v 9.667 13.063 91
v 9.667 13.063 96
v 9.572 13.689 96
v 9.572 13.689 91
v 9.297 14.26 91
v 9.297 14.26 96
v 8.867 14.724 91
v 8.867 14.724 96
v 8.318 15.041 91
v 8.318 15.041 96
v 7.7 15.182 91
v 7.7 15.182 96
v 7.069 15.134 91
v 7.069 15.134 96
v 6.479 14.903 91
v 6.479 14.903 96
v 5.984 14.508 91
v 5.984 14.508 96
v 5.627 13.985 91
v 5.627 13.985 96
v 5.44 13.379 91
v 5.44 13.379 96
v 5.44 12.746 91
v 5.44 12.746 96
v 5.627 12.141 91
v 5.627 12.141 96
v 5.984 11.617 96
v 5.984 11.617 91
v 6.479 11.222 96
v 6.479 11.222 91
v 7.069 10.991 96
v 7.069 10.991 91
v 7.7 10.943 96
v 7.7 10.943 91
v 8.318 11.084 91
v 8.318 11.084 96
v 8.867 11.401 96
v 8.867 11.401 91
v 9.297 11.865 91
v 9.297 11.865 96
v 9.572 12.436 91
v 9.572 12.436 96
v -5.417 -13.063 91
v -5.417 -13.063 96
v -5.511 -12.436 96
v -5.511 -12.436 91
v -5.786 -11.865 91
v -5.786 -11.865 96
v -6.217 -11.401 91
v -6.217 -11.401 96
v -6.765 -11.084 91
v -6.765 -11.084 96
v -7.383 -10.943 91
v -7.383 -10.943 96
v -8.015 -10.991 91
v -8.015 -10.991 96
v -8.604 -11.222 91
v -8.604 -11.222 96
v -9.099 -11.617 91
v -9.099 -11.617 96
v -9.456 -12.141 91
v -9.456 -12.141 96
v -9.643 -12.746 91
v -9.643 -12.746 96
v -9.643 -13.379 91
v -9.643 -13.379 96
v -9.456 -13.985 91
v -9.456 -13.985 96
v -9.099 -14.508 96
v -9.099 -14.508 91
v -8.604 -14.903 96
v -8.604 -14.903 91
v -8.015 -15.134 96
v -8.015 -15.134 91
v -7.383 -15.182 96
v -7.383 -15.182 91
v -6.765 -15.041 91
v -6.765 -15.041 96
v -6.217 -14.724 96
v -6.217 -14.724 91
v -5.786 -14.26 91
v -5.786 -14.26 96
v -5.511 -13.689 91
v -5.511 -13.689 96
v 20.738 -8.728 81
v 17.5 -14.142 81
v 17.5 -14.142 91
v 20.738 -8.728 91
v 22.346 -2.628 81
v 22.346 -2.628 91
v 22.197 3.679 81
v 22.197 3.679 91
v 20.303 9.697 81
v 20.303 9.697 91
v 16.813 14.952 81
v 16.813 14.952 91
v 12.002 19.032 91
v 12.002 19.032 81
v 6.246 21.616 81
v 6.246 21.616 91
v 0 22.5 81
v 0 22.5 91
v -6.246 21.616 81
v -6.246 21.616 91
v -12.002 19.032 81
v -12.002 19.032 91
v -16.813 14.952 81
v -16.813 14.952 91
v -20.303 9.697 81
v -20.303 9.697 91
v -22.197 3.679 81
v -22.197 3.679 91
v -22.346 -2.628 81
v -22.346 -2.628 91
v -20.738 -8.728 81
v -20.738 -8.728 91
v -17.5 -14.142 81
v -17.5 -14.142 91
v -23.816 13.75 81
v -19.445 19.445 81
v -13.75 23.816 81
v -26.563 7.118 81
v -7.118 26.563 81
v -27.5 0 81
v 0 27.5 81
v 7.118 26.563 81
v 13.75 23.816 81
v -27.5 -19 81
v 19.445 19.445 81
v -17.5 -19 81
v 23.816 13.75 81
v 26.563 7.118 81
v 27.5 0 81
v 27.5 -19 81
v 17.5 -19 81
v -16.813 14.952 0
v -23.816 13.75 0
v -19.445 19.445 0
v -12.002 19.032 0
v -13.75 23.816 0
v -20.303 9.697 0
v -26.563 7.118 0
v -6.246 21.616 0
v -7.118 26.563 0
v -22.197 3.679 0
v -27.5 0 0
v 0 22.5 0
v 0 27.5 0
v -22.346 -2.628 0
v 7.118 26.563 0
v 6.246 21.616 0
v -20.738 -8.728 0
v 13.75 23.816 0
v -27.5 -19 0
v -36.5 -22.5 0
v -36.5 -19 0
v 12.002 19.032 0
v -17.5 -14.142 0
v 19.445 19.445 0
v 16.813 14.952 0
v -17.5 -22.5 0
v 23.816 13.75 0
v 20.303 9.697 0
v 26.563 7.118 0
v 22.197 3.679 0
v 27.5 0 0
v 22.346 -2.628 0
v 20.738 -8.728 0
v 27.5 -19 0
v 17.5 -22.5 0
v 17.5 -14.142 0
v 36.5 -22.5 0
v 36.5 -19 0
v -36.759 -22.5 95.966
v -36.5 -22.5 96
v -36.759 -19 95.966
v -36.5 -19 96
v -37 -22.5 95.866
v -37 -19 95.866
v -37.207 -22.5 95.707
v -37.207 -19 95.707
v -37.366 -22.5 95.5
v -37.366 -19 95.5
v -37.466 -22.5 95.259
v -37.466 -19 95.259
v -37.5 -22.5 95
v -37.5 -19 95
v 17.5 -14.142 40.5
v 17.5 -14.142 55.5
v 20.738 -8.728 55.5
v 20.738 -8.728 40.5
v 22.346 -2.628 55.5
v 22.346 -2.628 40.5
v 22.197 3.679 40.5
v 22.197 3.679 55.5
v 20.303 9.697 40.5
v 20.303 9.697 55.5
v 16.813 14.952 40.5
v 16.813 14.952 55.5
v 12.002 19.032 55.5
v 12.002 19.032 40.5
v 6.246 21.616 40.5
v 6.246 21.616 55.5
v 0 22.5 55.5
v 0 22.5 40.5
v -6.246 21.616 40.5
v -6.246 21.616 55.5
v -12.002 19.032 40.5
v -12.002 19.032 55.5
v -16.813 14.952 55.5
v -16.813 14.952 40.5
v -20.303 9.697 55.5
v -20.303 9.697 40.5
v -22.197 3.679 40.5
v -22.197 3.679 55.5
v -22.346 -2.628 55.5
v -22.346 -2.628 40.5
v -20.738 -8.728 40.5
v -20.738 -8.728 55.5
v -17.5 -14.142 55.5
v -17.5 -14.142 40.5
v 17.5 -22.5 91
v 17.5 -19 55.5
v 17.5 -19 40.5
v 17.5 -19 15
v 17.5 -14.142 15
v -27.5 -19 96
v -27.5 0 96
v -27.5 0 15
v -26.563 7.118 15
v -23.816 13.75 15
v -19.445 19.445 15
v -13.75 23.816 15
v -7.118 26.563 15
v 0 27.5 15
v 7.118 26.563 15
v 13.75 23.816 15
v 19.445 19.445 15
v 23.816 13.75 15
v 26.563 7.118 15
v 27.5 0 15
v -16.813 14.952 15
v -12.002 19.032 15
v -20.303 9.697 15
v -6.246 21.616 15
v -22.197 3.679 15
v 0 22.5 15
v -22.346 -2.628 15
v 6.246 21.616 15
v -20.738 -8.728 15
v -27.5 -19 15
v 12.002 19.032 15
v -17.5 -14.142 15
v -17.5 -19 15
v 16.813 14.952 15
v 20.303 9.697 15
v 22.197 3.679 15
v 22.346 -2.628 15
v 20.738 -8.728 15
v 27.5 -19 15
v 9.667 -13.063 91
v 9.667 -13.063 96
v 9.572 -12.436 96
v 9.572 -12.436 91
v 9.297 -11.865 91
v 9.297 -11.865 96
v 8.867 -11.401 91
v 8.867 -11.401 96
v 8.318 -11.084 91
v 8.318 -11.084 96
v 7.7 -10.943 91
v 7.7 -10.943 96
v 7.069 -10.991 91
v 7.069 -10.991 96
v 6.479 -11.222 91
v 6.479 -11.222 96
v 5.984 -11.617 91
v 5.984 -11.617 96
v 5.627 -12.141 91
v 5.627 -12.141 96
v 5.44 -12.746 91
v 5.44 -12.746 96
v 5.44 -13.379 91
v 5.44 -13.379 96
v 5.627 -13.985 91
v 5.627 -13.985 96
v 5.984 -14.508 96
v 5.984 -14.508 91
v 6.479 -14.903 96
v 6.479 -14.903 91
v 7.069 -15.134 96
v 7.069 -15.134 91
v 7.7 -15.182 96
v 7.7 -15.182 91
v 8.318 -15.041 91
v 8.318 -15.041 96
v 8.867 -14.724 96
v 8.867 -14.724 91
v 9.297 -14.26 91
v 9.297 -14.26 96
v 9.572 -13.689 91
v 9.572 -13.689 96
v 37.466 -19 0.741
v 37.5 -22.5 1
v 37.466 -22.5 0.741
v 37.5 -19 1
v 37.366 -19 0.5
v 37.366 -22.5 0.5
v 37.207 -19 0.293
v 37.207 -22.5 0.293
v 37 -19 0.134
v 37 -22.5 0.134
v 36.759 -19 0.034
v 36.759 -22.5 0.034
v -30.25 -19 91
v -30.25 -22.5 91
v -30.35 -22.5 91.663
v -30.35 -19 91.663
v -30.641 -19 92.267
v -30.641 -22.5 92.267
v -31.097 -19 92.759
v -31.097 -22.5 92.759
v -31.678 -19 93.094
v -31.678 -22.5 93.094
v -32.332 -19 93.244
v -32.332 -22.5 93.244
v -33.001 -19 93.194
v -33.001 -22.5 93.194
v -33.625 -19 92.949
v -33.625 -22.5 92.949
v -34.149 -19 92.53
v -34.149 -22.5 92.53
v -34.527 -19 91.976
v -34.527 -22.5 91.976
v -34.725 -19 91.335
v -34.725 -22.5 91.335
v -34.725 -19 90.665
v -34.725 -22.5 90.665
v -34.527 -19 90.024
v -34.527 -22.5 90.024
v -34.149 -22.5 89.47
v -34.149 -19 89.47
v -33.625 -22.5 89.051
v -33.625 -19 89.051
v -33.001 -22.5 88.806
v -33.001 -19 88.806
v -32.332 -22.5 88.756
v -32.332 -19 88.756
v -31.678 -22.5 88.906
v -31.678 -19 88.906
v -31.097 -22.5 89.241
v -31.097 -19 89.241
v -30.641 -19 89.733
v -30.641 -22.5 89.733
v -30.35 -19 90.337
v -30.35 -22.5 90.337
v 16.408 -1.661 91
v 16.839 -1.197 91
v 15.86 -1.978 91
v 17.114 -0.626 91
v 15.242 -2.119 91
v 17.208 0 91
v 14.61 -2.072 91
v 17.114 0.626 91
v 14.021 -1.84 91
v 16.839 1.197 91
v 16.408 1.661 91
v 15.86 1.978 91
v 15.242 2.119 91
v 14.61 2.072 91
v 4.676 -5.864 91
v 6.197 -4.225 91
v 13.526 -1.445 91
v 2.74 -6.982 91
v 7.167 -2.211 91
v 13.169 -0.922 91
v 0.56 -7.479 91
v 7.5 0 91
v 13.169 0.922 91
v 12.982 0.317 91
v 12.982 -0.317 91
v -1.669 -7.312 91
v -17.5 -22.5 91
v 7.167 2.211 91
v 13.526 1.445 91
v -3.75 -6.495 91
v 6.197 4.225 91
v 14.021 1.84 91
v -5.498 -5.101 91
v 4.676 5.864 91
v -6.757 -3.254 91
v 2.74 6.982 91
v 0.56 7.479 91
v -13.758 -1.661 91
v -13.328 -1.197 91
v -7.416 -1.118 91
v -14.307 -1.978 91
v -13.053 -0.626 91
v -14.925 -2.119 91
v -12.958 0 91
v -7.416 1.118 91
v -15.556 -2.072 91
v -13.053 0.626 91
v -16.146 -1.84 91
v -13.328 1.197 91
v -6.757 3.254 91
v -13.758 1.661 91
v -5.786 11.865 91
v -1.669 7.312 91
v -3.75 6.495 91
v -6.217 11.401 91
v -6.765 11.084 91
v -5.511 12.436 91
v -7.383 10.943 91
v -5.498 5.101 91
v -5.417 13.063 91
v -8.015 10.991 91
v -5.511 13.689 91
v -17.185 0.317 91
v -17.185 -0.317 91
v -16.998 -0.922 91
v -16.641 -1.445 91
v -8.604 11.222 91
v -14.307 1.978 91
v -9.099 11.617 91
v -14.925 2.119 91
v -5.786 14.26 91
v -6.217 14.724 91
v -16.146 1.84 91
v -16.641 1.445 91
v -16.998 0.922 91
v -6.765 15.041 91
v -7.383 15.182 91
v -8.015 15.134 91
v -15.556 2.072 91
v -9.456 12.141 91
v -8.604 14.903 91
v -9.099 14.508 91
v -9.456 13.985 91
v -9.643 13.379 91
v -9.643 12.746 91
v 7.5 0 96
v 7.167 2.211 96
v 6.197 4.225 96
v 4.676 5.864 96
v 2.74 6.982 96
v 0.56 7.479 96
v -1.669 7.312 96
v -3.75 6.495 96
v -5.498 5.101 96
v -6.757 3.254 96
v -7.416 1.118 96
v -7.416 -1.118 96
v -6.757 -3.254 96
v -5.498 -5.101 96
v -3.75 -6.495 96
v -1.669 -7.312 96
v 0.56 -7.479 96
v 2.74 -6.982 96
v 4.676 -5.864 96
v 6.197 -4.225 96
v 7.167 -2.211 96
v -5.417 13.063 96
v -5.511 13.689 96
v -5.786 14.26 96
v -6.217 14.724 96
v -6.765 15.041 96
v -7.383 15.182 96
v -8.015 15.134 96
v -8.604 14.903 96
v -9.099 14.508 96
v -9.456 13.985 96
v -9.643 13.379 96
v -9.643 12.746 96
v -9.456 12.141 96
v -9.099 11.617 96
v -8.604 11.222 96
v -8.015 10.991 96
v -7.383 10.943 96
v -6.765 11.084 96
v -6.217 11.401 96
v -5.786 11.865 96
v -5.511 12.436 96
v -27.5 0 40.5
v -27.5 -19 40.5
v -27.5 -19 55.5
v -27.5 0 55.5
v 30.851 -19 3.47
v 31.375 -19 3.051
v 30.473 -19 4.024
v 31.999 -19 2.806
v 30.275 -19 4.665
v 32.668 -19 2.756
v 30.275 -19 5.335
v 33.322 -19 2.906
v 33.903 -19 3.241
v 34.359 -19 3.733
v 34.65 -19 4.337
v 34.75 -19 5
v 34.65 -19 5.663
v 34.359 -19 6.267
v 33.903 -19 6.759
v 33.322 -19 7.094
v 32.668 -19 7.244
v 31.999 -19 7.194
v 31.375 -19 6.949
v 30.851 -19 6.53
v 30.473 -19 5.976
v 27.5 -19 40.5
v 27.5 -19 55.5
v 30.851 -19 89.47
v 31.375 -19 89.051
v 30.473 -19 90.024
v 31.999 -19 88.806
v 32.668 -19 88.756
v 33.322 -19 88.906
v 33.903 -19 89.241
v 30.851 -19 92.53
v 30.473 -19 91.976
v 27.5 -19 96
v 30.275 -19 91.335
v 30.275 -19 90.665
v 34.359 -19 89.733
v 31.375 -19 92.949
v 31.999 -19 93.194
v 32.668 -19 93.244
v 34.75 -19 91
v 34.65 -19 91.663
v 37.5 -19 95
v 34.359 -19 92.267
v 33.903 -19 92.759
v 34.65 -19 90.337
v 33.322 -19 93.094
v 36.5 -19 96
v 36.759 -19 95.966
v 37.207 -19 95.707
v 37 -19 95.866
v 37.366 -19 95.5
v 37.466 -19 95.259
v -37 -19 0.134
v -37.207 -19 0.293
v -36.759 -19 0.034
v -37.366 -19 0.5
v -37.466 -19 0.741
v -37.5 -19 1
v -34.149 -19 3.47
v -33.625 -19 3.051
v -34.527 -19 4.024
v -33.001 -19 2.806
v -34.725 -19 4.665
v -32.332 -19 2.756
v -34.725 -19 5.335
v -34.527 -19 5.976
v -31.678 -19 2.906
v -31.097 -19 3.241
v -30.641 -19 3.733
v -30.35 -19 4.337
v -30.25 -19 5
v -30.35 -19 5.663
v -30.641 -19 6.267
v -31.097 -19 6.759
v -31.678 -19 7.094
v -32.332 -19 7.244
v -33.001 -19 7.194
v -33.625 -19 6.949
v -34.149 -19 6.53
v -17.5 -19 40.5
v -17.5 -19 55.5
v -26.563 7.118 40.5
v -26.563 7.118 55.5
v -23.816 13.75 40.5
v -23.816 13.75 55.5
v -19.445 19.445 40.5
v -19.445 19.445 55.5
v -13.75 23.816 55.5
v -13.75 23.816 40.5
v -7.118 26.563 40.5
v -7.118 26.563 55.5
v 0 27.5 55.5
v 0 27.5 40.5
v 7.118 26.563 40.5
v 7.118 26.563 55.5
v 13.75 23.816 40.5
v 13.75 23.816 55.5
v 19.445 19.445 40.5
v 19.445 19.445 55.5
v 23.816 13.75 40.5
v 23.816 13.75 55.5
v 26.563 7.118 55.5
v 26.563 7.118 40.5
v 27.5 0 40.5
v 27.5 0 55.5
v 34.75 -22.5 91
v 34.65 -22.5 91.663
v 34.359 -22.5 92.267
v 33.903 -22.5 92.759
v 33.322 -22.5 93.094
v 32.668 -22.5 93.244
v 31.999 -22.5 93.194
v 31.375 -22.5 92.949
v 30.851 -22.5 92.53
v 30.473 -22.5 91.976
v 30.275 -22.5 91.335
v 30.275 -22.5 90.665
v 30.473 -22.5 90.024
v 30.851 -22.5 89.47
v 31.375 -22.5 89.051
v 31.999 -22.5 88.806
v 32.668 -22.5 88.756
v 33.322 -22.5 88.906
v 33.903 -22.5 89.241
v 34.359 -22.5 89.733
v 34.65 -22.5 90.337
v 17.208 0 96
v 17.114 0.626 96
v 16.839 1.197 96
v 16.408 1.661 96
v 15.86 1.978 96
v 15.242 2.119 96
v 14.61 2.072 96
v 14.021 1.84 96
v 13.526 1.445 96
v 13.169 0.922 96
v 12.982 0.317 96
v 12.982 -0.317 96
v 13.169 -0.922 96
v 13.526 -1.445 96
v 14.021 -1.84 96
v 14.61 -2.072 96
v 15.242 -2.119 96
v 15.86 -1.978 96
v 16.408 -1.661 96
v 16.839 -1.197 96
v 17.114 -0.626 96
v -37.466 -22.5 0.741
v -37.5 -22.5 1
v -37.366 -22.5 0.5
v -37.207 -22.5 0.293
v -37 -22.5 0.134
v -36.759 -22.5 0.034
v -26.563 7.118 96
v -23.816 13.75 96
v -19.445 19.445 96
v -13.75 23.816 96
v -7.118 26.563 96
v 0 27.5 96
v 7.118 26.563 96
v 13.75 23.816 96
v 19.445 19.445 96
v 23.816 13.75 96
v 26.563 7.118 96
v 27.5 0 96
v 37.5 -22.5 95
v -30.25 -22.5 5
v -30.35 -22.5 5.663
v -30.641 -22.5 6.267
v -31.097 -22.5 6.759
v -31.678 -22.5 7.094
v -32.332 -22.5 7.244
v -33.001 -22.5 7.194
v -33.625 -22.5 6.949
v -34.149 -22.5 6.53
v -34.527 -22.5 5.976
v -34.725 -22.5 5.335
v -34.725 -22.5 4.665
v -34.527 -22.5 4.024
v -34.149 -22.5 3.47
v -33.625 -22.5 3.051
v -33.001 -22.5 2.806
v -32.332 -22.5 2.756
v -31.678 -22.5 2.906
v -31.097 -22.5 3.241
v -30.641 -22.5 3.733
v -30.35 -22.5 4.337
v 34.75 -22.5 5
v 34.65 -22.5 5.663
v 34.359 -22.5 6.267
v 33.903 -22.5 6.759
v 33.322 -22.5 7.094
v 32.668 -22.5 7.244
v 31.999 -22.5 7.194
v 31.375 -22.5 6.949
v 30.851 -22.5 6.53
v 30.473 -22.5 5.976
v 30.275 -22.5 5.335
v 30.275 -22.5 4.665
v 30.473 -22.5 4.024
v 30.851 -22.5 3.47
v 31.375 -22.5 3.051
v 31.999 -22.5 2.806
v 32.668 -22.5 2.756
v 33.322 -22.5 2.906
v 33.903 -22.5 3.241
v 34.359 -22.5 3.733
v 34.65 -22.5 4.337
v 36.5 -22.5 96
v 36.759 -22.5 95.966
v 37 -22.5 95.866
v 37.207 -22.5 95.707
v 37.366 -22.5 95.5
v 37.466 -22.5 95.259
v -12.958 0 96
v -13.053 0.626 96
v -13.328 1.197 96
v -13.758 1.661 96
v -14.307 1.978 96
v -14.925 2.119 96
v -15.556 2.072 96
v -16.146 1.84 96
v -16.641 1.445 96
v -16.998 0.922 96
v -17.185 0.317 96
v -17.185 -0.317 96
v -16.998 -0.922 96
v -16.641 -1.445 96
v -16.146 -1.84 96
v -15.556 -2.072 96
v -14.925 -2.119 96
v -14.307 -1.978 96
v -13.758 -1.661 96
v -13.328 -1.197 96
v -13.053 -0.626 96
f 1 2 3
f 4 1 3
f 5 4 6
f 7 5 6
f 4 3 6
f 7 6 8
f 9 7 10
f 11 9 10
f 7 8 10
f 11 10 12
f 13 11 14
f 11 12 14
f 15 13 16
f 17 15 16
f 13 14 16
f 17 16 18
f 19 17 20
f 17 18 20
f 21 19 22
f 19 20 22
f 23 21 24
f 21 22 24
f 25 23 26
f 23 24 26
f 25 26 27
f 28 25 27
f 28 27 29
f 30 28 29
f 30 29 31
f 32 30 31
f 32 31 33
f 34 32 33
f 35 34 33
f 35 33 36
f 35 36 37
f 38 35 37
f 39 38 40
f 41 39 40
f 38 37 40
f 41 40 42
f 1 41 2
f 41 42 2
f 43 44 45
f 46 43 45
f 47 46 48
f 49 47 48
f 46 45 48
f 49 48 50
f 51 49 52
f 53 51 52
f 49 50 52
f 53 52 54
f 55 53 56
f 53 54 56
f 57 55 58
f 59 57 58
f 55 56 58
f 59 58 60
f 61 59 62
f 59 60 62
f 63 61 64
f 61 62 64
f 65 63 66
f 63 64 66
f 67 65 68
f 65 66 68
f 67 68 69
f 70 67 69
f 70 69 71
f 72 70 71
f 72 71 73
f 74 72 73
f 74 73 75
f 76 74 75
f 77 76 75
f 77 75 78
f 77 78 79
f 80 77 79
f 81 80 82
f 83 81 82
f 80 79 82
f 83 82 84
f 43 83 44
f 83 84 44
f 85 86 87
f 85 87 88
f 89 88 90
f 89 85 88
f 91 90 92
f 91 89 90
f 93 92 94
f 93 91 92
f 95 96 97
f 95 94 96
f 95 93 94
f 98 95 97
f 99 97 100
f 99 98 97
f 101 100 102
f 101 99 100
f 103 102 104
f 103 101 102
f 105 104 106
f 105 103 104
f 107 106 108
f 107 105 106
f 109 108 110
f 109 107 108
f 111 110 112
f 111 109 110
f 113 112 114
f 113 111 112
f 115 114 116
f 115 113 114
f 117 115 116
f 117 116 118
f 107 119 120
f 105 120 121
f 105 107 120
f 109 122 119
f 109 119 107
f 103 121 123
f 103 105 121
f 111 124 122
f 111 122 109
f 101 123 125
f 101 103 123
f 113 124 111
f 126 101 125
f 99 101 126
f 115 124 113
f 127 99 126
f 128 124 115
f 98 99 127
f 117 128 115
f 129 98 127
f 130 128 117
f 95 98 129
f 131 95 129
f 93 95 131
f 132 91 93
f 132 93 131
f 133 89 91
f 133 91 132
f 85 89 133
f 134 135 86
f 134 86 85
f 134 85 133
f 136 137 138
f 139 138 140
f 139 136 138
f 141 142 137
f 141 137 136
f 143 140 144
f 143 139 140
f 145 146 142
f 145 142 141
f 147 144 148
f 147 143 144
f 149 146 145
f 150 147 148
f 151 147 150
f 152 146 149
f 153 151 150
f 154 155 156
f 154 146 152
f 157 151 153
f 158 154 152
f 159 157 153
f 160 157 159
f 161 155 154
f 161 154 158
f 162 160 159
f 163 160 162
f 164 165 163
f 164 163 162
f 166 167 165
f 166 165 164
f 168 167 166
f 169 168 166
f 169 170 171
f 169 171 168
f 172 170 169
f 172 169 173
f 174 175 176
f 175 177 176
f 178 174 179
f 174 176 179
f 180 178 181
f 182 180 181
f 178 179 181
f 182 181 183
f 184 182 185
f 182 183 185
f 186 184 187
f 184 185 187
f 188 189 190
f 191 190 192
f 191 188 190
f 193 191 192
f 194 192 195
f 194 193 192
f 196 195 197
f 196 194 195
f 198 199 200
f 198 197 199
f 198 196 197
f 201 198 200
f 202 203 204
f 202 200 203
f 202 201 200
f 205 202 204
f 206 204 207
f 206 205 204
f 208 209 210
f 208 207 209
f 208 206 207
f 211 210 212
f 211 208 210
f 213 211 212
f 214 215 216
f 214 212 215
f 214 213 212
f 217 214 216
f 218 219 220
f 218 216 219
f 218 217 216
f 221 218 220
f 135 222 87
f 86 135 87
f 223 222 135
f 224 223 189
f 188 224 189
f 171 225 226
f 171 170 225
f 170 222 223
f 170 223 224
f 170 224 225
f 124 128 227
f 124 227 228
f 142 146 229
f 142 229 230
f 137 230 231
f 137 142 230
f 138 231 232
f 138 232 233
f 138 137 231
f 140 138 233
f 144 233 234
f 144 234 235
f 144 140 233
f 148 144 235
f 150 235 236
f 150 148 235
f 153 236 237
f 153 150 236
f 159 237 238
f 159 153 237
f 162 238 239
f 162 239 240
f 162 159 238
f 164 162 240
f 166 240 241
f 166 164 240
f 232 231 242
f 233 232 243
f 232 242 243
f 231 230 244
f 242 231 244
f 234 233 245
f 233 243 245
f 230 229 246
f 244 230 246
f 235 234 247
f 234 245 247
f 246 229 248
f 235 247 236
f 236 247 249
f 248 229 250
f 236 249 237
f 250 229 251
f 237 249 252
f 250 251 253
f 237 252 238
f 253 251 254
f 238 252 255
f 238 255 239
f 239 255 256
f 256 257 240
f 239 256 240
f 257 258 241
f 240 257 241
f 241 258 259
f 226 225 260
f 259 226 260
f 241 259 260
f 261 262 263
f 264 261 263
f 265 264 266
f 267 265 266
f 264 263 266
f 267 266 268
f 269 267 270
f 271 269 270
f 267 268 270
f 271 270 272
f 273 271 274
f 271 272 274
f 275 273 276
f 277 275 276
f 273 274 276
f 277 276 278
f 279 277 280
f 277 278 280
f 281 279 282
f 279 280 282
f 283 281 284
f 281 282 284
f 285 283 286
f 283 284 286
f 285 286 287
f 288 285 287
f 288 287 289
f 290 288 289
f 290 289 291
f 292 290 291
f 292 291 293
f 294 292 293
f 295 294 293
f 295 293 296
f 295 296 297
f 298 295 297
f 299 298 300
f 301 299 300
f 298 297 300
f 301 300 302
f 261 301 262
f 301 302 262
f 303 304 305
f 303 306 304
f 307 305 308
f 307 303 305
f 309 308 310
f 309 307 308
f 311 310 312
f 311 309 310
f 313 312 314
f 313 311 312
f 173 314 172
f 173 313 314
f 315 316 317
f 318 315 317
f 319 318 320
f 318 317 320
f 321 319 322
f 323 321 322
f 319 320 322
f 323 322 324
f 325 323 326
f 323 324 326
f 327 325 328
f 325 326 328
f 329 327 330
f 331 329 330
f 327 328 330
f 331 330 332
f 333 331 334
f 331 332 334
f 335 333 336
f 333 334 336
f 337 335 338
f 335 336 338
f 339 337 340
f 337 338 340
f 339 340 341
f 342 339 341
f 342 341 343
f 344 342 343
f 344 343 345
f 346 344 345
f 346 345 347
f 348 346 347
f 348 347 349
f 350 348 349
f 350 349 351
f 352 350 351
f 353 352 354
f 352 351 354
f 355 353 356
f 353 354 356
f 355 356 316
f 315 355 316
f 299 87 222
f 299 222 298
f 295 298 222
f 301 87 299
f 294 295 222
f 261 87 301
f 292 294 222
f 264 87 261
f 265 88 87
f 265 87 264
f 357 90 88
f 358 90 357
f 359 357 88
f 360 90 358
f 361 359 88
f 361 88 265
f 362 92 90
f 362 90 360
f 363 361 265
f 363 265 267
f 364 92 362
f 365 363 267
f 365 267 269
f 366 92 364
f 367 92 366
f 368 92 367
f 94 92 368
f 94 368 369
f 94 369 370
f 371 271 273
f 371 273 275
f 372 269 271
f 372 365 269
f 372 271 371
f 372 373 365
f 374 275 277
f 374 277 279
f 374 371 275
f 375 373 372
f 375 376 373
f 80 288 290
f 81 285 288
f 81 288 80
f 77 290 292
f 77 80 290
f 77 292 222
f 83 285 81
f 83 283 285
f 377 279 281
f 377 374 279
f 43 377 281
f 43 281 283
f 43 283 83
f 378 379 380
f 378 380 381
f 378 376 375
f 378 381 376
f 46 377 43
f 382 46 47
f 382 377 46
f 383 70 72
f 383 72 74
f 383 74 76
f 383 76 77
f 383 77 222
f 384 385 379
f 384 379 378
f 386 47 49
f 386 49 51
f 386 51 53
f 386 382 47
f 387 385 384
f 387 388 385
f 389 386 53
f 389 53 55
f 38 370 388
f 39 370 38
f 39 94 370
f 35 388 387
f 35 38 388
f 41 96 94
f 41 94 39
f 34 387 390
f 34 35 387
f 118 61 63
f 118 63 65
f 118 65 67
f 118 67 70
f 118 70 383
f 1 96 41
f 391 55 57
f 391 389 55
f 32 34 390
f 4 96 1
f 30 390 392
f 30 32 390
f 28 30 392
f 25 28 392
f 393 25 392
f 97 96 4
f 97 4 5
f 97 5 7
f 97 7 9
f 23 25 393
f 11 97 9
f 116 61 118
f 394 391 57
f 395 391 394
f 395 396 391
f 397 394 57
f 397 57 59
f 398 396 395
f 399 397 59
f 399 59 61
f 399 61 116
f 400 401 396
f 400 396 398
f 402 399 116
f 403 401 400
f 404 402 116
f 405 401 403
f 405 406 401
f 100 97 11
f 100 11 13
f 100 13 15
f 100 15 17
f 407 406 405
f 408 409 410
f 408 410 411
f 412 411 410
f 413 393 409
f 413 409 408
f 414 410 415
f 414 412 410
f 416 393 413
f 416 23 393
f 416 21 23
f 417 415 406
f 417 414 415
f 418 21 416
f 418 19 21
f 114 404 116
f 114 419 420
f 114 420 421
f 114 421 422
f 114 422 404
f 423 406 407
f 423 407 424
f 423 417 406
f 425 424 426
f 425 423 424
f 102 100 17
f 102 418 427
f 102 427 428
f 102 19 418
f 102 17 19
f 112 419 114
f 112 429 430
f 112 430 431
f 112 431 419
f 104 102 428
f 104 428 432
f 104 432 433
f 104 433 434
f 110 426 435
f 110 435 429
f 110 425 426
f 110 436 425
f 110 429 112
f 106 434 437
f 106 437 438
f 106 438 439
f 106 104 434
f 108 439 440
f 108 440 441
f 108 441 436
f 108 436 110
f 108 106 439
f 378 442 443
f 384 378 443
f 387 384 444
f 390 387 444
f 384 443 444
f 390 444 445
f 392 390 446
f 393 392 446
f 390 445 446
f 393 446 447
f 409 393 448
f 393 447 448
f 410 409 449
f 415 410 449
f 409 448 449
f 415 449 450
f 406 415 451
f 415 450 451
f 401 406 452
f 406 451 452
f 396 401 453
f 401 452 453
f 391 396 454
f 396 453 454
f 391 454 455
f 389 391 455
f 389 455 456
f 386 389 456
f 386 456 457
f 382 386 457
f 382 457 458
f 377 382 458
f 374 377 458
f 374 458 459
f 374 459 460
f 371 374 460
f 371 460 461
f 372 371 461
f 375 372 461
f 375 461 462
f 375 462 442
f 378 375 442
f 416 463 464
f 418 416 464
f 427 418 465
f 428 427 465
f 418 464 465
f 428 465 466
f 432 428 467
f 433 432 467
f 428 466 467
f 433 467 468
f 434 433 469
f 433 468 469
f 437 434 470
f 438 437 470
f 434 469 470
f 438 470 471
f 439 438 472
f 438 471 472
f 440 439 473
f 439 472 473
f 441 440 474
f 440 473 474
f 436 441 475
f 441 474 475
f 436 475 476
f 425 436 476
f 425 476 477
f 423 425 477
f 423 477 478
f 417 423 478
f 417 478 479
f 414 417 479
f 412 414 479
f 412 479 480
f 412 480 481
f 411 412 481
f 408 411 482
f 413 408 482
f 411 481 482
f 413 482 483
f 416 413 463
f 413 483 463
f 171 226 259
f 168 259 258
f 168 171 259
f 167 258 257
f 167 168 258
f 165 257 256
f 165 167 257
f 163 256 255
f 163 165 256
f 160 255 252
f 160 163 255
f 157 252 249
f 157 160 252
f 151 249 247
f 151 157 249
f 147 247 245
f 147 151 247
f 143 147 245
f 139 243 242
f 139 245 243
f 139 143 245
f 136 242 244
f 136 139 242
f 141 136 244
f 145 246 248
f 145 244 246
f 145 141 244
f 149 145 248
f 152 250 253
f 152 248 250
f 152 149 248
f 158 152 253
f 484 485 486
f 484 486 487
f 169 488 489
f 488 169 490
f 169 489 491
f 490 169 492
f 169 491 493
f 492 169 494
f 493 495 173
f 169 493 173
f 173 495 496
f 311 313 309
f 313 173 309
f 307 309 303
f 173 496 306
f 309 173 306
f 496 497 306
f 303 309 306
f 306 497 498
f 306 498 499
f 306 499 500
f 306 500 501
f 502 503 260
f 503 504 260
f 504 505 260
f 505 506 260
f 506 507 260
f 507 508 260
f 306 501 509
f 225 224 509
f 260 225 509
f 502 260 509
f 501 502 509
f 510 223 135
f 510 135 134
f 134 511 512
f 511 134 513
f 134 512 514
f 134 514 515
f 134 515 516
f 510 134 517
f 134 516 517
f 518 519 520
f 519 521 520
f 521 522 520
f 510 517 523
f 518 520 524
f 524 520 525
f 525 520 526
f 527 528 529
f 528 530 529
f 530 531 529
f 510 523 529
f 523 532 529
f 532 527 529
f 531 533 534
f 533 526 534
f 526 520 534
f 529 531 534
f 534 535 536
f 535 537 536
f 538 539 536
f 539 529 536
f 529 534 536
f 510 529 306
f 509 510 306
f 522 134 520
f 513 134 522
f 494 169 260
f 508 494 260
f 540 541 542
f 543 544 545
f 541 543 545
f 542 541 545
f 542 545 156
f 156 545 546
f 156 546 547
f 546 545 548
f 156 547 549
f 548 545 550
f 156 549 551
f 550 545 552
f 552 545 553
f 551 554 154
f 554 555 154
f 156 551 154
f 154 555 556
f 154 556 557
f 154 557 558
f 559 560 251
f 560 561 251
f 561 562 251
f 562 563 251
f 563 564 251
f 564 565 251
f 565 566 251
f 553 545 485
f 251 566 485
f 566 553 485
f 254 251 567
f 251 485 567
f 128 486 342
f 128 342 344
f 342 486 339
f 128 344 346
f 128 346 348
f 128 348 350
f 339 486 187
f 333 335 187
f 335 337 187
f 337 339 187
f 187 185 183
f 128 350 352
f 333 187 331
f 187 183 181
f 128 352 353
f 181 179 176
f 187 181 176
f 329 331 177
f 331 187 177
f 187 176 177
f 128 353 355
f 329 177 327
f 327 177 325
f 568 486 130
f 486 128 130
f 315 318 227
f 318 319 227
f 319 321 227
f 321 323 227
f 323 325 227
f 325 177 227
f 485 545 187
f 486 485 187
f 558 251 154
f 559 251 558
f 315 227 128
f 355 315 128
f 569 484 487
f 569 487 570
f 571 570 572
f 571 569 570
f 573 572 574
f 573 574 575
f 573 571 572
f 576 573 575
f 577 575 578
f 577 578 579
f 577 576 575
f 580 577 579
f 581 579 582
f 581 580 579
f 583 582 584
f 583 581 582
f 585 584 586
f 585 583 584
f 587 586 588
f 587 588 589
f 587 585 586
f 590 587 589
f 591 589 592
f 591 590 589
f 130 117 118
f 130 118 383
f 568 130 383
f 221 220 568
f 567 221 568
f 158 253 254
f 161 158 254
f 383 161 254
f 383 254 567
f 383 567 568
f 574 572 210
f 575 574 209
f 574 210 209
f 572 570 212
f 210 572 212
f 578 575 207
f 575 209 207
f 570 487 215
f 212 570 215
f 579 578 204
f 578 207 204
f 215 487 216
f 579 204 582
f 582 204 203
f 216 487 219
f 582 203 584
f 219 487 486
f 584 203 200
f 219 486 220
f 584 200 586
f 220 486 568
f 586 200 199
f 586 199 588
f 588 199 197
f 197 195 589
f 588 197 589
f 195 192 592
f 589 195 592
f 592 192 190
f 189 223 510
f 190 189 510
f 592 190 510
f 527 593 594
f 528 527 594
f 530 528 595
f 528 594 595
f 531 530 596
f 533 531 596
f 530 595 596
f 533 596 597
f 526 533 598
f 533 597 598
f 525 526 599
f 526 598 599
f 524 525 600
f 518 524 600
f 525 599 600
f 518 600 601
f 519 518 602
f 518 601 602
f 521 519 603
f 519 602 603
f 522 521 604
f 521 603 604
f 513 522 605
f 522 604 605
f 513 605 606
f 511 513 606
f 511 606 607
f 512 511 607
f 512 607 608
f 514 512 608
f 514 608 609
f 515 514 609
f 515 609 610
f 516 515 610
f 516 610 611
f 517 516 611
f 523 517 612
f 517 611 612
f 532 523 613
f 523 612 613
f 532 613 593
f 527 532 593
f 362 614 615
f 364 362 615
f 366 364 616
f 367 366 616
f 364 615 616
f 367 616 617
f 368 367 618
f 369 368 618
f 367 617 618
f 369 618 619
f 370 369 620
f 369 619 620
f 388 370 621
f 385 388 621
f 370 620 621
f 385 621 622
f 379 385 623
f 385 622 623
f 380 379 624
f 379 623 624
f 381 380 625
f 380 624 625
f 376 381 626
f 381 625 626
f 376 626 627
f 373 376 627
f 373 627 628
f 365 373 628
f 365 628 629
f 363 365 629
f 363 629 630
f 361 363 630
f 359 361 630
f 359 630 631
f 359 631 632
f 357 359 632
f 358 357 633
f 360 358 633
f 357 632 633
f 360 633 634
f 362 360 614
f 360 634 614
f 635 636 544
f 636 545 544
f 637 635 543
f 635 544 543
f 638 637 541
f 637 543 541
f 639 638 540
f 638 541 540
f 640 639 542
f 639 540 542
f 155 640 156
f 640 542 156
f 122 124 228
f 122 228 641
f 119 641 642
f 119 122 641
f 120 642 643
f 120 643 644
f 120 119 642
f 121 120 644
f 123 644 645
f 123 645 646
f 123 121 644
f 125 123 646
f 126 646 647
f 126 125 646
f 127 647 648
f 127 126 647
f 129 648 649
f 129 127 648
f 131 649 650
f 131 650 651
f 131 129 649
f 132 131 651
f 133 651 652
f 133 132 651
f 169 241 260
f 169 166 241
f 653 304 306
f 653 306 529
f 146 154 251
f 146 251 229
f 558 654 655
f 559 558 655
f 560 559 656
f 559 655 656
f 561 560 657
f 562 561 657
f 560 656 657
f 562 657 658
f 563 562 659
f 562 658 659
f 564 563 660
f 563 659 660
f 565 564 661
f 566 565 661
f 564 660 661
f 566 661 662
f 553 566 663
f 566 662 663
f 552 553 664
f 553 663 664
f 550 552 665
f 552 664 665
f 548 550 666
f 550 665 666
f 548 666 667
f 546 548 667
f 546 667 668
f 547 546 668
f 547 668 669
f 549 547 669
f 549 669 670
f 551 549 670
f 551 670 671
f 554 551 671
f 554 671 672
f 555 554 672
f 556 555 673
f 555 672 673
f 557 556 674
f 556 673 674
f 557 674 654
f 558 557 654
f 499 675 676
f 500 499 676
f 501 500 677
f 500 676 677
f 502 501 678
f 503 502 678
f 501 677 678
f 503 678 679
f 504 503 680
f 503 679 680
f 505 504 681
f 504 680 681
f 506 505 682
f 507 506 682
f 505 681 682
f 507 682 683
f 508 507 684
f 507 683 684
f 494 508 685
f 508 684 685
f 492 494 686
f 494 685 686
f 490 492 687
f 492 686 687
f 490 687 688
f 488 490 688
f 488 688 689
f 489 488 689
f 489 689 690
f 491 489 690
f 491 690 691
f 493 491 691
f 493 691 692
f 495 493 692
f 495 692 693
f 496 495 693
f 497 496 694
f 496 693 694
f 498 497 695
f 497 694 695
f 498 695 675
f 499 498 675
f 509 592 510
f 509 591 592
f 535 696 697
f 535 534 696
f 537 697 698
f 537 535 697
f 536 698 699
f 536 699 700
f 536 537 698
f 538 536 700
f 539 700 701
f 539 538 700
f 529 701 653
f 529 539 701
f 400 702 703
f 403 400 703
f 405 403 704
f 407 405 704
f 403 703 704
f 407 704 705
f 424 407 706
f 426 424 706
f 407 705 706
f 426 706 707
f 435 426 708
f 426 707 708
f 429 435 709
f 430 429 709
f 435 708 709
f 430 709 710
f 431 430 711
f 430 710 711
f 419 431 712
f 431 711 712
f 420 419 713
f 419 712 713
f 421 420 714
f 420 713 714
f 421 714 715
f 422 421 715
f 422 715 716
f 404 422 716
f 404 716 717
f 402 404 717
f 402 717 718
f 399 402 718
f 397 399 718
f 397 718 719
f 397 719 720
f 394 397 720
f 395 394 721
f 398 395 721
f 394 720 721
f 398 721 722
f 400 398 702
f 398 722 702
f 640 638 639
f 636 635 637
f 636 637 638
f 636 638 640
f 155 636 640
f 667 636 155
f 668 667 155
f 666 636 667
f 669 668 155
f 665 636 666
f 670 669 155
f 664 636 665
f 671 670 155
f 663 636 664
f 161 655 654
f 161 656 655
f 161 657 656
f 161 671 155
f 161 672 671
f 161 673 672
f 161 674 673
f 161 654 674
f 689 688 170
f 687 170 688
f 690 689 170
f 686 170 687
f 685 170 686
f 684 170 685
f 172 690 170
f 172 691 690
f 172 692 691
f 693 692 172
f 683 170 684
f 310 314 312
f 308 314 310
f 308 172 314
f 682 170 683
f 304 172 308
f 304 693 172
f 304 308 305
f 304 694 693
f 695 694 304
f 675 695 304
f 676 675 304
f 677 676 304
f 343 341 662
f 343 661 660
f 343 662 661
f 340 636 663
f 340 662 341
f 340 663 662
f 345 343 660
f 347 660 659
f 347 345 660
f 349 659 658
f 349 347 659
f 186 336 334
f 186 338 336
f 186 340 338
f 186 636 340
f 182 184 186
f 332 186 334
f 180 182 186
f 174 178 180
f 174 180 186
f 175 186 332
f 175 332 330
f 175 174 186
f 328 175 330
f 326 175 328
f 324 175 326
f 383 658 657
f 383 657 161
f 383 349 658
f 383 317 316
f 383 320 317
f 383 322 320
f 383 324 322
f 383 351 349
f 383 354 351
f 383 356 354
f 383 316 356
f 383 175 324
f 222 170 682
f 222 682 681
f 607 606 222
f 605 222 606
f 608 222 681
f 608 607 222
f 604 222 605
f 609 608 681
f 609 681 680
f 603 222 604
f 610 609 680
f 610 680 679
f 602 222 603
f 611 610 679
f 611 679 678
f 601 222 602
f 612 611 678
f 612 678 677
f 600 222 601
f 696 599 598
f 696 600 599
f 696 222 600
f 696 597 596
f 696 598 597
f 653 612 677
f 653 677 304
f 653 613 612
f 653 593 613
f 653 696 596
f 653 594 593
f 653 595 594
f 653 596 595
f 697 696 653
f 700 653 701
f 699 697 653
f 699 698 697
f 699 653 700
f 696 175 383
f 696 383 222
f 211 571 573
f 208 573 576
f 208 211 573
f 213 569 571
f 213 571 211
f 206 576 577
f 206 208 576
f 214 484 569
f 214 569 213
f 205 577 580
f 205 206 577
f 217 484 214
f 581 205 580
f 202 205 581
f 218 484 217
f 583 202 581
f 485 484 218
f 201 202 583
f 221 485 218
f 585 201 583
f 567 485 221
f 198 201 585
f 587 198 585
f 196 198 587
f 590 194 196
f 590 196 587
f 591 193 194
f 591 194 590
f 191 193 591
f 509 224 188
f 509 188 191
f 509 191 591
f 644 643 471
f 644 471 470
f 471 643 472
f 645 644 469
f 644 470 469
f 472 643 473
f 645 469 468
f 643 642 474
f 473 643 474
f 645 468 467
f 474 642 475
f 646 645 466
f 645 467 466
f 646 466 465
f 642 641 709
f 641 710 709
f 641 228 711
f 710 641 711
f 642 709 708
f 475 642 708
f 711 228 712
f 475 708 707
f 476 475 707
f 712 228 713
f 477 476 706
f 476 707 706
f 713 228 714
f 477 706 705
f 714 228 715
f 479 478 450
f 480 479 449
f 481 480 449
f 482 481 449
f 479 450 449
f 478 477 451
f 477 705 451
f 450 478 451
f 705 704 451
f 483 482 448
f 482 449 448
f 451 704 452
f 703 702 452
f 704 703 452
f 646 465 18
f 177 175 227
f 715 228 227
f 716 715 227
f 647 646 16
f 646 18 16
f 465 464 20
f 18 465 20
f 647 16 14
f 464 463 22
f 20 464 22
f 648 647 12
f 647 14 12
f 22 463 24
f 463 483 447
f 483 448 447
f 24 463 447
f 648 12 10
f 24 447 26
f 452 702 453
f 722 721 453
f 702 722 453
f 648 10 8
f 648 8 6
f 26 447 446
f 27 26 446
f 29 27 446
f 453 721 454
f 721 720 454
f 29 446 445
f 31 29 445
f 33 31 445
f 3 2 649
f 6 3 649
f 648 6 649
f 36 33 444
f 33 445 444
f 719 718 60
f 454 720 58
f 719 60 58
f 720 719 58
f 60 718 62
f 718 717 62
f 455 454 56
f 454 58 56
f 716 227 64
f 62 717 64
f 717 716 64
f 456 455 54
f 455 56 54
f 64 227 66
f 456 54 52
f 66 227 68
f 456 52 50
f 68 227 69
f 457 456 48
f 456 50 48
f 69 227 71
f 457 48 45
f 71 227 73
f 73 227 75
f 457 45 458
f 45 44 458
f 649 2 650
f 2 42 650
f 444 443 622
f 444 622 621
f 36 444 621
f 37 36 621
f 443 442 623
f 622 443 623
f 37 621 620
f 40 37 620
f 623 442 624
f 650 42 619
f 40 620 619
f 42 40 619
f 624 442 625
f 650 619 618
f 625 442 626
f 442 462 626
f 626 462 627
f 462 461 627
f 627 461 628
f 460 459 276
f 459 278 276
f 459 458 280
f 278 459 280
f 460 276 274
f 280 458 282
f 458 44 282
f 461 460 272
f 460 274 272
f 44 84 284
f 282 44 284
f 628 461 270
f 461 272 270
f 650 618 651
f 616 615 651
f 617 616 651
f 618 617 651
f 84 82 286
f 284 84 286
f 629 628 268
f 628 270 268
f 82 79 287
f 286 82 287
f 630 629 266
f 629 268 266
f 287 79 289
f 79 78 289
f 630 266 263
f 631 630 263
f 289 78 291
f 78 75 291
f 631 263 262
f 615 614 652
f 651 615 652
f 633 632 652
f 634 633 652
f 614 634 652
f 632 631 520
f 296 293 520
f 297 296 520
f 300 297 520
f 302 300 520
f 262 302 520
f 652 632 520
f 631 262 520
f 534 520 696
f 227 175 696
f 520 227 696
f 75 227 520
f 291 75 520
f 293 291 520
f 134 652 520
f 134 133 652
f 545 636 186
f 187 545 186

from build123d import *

# Parameters (mm, degrees)
BOSS_EXTRUDE2_DEPTH = 96
SKETCH4_W           = 10
SKETCH4_H           = 96
SKETCH4_R           = 2.25
BOSS_EXTRUDE3_DEPTH = 3.5
BOSS_EXTRUDE4_START = -5
BOSS_EXTRUDE4_DEPTH = 5
SKETCH6_R           = 2.125
CUT_EXTRUDE1_DEPTH  = 5
SKETCH7_R           = 7.5
CUT_EXTRUDE2_DEPTH  = 97
SKETCH8_W           = 55
SKETCH8_H           = 25.5
CUT_EXTRUDE3_DEPTH  = 47.5
FILLET1_R           = 1


with BuildPart() as part:
    # Sketch1 → Boss-Extrude2 (new body)
    with BuildSketch(Plane.XY):
        with BuildLine():
            Line((-27.5, -22.5), (-27.5, 0))
            ThreePointArc((-27.5, 0), (0, 27.5), (27.5, 0))
            Line((27.5, 0), (27.5, -22.5))
            Line((27.5, -22.5), (17.5, -22.5))
            Line((17.5, -22.5), (17.5, -14.142135624))
            ThreePointArc((17.5, -14.142135624), (0, 22.5), (-17.5, -14.142135624))
            Line((-17.5, -14.142135624), (-17.5, -22.5))
            Line((-17.5, -22.5), (-27.5, -22.5))
        make_face()
    extrude(amount=BOSS_EXTRUDE2_DEPTH)

    # Sketch4 → Boss-Extrude3 (add)
    with BuildSketch(Plane.XZ.offset(22.5)):
        with Locations((-32.5, 48)):
            Rectangle(SKETCH4_W, SKETCH4_H)
        with Locations((-32.5, 91)):
            Circle(SKETCH4_R, mode=Mode.SUBTRACT)
        with Locations((-32.5, 5)):
            Circle(SKETCH4_R, mode=Mode.SUBTRACT)
        with Locations((32.5, 48)):
            Rectangle(SKETCH4_W, SKETCH4_H)
        with Locations((32.5, 5)):
            Circle(SKETCH4_R, mode=Mode.SUBTRACT)
        with Locations((32.5, 91)):
            Circle(SKETCH4_R, mode=Mode.SUBTRACT)
    extrude(amount=-BOSS_EXTRUDE3_DEPTH)

    # Sketch5 → Boss-Extrude4 (add)
    with BuildSketch(Plane.XY.offset(96).offset(BOSS_EXTRUDE4_START)):
        with BuildLine():
            Line((-27.5, -19), (-27.5, 0))
            ThreePointArc((-27.5, 0), (0, 27.5), (27.5, 0))
            Line((27.5, 0), (27.5, -19))
            Line((27.5, -19), (27.5, -22.5))
            Line((27.5, -22.5), (-27.5, -22.5))
            Line((-27.5, -22.5), (-27.5, -19))
        make_face()
    extrude(amount=BOSS_EXTRUDE4_DEPTH)

    # Sketch6 → Cut-Extrude1 (cut)
    with BuildSketch(Plane.XY.offset(96)):
        with Locations((-7.541666667, 13.06254984)):
            Circle(SKETCH6_R)
        with Locations((7.541666667, 13.06254984)):
            Circle(SKETCH6_R)
        with Locations((15.083333333, 0)):
            Circle(SKETCH6_R)
        with Locations((7.541666667, -13.06254984)):
            Circle(SKETCH6_R)
        with Locations((-7.541666667, -13.06254984)):
            Circle(SKETCH6_R)
        with Locations((-15.083333333, 0)):
            Circle(SKETCH6_R)
    extrude(amount=-CUT_EXTRUDE1_DEPTH, mode=Mode.SUBTRACT)

    # Sketch7 → Cut-Extrude2 (cut, through all)
    with BuildSketch(Plane.XY.offset(96)):
        Circle(SKETCH7_R)
    extrude(amount=-CUT_EXTRUDE2_DEPTH, mode=Mode.SUBTRACT)

    # Sketch8 → Cut-Extrude3 (cut, through all)
    with BuildSketch(Plane(origin=(0, -19, 0), x_dir=(1, 0, 0), z_dir=(0, 1, 0))):
        with Locations((0, -27.75)):
            Rectangle(SKETCH8_W, SKETCH8_H)
        with Locations((0, -68.25)):
            Rectangle(SKETCH8_W, SKETCH8_H)
    extrude(amount=CUT_EXTRUDE3_DEPTH, mode=Mode.SUBTRACT)

    # Fillet1
    fillet1_edges = [part.edges().sort_by_distance(p)[0] for p in [
        (-37.5, -20.75, 0),
        (-37.5, -20.75, 96),
        (37.5, -20.75, 96),
        (37.5, -20.75, 0),
    ]]
    fillet(fillet1_edges, radius=FILLET1_R)


solid = part.part
